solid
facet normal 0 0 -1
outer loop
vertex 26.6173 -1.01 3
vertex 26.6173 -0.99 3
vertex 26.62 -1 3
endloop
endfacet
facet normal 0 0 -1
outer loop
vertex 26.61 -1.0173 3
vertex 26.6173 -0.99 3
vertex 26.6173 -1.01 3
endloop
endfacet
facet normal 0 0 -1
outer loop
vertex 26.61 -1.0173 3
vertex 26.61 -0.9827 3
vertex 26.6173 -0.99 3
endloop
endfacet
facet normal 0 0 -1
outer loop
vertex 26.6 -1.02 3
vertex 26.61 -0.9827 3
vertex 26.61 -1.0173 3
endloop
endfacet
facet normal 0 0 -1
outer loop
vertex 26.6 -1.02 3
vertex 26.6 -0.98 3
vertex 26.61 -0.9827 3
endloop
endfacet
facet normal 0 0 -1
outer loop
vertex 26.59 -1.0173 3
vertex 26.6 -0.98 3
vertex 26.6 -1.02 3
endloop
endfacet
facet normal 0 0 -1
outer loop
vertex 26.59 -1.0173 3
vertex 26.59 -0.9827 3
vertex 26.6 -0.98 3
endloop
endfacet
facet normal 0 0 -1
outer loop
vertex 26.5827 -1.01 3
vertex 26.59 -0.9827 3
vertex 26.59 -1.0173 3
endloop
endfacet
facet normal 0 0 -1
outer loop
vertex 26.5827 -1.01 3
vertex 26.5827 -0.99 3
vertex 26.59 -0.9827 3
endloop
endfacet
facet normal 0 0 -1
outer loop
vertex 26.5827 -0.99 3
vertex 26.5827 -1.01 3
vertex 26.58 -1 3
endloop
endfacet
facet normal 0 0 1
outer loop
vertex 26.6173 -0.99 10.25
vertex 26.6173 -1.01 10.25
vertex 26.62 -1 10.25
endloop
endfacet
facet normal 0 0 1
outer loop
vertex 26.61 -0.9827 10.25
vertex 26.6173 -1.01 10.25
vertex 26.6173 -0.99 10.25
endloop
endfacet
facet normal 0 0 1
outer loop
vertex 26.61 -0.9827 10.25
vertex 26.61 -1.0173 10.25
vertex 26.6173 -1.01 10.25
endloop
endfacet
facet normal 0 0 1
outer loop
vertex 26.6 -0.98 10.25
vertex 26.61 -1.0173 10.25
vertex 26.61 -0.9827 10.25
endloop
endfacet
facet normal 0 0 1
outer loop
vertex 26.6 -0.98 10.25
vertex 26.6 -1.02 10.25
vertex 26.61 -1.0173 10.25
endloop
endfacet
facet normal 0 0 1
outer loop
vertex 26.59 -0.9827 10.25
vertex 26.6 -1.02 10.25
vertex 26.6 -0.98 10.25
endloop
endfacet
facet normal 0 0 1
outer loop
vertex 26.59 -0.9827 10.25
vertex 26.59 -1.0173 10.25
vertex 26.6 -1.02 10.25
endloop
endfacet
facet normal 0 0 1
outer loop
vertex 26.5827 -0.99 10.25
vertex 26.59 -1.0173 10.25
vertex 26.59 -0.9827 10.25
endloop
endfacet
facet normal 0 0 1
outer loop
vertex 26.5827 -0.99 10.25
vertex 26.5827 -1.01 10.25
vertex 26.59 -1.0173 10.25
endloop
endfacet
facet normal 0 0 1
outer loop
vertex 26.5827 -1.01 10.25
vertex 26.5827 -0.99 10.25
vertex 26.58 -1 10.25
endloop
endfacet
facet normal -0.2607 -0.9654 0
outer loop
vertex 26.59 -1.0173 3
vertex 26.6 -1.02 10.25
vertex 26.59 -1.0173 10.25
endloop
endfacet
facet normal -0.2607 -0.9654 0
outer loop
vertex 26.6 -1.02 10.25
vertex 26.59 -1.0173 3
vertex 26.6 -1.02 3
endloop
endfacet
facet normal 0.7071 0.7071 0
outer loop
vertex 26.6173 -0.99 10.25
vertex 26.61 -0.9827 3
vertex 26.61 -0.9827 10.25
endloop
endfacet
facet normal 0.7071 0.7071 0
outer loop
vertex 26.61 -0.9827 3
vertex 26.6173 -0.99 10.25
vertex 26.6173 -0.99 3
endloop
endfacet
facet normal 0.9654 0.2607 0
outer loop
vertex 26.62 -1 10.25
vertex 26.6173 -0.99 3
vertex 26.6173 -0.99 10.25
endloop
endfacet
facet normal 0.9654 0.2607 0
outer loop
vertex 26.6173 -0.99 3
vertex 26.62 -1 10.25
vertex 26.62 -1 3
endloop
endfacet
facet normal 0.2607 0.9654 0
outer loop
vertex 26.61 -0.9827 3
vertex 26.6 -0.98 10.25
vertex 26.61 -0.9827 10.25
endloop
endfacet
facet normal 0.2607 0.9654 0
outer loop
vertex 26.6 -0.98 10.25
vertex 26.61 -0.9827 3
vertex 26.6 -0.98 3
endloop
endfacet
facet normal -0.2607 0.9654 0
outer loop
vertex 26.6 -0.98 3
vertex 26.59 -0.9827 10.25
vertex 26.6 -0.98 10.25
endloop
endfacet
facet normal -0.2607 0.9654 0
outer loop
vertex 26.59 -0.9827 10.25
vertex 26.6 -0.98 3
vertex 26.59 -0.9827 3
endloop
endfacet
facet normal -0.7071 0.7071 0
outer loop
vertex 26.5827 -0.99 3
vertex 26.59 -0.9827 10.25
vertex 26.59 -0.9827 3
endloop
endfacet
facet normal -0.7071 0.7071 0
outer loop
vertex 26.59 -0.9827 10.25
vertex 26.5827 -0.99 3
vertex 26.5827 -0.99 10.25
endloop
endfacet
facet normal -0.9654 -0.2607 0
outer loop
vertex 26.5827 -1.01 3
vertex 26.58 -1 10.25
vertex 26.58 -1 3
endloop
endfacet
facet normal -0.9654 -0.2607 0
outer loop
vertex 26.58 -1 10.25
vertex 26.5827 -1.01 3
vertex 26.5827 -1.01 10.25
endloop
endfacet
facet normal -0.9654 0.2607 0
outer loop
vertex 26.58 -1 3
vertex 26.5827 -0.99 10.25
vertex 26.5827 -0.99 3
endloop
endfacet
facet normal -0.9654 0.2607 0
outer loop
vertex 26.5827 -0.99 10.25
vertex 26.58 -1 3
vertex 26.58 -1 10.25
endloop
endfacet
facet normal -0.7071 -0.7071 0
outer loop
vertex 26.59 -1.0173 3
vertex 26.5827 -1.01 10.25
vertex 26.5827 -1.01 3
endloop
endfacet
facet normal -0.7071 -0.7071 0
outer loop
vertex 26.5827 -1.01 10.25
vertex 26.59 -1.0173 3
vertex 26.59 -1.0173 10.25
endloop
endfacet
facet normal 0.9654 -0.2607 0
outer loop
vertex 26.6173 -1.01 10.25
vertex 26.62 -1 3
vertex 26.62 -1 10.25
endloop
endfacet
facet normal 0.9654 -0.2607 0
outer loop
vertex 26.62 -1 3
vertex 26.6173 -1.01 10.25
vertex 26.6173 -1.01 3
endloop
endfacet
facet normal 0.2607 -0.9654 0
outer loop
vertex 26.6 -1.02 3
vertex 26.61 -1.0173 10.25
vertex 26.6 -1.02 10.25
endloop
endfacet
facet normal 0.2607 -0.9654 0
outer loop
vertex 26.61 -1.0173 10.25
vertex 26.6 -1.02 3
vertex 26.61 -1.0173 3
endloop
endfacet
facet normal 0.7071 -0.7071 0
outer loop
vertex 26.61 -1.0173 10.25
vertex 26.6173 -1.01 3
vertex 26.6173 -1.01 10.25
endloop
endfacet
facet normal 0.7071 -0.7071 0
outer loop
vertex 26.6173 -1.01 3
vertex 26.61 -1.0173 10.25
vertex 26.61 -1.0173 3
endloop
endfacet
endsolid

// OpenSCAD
// Expected remaining wall: Z3...10.25. The relief does not reach the bearing at Z3...10.
// The probe is inside the MCU relief, outside the ordinary rear pocket R>=27.
use <../../../output/reducer_cap_encoder_can.scad>
use <../design/placed_components.scad>
intersection() {
    difference() {
        encoder_cap_base();
        encoder_can_mcu_clearance(pcb_bottom_z=11,xy_gap=.2,z_gap=.15,eps=.01);
    }
    translate([26.6,-1,-.1]) cylinder(r=.02,h=11.2,$fn=12);
}
